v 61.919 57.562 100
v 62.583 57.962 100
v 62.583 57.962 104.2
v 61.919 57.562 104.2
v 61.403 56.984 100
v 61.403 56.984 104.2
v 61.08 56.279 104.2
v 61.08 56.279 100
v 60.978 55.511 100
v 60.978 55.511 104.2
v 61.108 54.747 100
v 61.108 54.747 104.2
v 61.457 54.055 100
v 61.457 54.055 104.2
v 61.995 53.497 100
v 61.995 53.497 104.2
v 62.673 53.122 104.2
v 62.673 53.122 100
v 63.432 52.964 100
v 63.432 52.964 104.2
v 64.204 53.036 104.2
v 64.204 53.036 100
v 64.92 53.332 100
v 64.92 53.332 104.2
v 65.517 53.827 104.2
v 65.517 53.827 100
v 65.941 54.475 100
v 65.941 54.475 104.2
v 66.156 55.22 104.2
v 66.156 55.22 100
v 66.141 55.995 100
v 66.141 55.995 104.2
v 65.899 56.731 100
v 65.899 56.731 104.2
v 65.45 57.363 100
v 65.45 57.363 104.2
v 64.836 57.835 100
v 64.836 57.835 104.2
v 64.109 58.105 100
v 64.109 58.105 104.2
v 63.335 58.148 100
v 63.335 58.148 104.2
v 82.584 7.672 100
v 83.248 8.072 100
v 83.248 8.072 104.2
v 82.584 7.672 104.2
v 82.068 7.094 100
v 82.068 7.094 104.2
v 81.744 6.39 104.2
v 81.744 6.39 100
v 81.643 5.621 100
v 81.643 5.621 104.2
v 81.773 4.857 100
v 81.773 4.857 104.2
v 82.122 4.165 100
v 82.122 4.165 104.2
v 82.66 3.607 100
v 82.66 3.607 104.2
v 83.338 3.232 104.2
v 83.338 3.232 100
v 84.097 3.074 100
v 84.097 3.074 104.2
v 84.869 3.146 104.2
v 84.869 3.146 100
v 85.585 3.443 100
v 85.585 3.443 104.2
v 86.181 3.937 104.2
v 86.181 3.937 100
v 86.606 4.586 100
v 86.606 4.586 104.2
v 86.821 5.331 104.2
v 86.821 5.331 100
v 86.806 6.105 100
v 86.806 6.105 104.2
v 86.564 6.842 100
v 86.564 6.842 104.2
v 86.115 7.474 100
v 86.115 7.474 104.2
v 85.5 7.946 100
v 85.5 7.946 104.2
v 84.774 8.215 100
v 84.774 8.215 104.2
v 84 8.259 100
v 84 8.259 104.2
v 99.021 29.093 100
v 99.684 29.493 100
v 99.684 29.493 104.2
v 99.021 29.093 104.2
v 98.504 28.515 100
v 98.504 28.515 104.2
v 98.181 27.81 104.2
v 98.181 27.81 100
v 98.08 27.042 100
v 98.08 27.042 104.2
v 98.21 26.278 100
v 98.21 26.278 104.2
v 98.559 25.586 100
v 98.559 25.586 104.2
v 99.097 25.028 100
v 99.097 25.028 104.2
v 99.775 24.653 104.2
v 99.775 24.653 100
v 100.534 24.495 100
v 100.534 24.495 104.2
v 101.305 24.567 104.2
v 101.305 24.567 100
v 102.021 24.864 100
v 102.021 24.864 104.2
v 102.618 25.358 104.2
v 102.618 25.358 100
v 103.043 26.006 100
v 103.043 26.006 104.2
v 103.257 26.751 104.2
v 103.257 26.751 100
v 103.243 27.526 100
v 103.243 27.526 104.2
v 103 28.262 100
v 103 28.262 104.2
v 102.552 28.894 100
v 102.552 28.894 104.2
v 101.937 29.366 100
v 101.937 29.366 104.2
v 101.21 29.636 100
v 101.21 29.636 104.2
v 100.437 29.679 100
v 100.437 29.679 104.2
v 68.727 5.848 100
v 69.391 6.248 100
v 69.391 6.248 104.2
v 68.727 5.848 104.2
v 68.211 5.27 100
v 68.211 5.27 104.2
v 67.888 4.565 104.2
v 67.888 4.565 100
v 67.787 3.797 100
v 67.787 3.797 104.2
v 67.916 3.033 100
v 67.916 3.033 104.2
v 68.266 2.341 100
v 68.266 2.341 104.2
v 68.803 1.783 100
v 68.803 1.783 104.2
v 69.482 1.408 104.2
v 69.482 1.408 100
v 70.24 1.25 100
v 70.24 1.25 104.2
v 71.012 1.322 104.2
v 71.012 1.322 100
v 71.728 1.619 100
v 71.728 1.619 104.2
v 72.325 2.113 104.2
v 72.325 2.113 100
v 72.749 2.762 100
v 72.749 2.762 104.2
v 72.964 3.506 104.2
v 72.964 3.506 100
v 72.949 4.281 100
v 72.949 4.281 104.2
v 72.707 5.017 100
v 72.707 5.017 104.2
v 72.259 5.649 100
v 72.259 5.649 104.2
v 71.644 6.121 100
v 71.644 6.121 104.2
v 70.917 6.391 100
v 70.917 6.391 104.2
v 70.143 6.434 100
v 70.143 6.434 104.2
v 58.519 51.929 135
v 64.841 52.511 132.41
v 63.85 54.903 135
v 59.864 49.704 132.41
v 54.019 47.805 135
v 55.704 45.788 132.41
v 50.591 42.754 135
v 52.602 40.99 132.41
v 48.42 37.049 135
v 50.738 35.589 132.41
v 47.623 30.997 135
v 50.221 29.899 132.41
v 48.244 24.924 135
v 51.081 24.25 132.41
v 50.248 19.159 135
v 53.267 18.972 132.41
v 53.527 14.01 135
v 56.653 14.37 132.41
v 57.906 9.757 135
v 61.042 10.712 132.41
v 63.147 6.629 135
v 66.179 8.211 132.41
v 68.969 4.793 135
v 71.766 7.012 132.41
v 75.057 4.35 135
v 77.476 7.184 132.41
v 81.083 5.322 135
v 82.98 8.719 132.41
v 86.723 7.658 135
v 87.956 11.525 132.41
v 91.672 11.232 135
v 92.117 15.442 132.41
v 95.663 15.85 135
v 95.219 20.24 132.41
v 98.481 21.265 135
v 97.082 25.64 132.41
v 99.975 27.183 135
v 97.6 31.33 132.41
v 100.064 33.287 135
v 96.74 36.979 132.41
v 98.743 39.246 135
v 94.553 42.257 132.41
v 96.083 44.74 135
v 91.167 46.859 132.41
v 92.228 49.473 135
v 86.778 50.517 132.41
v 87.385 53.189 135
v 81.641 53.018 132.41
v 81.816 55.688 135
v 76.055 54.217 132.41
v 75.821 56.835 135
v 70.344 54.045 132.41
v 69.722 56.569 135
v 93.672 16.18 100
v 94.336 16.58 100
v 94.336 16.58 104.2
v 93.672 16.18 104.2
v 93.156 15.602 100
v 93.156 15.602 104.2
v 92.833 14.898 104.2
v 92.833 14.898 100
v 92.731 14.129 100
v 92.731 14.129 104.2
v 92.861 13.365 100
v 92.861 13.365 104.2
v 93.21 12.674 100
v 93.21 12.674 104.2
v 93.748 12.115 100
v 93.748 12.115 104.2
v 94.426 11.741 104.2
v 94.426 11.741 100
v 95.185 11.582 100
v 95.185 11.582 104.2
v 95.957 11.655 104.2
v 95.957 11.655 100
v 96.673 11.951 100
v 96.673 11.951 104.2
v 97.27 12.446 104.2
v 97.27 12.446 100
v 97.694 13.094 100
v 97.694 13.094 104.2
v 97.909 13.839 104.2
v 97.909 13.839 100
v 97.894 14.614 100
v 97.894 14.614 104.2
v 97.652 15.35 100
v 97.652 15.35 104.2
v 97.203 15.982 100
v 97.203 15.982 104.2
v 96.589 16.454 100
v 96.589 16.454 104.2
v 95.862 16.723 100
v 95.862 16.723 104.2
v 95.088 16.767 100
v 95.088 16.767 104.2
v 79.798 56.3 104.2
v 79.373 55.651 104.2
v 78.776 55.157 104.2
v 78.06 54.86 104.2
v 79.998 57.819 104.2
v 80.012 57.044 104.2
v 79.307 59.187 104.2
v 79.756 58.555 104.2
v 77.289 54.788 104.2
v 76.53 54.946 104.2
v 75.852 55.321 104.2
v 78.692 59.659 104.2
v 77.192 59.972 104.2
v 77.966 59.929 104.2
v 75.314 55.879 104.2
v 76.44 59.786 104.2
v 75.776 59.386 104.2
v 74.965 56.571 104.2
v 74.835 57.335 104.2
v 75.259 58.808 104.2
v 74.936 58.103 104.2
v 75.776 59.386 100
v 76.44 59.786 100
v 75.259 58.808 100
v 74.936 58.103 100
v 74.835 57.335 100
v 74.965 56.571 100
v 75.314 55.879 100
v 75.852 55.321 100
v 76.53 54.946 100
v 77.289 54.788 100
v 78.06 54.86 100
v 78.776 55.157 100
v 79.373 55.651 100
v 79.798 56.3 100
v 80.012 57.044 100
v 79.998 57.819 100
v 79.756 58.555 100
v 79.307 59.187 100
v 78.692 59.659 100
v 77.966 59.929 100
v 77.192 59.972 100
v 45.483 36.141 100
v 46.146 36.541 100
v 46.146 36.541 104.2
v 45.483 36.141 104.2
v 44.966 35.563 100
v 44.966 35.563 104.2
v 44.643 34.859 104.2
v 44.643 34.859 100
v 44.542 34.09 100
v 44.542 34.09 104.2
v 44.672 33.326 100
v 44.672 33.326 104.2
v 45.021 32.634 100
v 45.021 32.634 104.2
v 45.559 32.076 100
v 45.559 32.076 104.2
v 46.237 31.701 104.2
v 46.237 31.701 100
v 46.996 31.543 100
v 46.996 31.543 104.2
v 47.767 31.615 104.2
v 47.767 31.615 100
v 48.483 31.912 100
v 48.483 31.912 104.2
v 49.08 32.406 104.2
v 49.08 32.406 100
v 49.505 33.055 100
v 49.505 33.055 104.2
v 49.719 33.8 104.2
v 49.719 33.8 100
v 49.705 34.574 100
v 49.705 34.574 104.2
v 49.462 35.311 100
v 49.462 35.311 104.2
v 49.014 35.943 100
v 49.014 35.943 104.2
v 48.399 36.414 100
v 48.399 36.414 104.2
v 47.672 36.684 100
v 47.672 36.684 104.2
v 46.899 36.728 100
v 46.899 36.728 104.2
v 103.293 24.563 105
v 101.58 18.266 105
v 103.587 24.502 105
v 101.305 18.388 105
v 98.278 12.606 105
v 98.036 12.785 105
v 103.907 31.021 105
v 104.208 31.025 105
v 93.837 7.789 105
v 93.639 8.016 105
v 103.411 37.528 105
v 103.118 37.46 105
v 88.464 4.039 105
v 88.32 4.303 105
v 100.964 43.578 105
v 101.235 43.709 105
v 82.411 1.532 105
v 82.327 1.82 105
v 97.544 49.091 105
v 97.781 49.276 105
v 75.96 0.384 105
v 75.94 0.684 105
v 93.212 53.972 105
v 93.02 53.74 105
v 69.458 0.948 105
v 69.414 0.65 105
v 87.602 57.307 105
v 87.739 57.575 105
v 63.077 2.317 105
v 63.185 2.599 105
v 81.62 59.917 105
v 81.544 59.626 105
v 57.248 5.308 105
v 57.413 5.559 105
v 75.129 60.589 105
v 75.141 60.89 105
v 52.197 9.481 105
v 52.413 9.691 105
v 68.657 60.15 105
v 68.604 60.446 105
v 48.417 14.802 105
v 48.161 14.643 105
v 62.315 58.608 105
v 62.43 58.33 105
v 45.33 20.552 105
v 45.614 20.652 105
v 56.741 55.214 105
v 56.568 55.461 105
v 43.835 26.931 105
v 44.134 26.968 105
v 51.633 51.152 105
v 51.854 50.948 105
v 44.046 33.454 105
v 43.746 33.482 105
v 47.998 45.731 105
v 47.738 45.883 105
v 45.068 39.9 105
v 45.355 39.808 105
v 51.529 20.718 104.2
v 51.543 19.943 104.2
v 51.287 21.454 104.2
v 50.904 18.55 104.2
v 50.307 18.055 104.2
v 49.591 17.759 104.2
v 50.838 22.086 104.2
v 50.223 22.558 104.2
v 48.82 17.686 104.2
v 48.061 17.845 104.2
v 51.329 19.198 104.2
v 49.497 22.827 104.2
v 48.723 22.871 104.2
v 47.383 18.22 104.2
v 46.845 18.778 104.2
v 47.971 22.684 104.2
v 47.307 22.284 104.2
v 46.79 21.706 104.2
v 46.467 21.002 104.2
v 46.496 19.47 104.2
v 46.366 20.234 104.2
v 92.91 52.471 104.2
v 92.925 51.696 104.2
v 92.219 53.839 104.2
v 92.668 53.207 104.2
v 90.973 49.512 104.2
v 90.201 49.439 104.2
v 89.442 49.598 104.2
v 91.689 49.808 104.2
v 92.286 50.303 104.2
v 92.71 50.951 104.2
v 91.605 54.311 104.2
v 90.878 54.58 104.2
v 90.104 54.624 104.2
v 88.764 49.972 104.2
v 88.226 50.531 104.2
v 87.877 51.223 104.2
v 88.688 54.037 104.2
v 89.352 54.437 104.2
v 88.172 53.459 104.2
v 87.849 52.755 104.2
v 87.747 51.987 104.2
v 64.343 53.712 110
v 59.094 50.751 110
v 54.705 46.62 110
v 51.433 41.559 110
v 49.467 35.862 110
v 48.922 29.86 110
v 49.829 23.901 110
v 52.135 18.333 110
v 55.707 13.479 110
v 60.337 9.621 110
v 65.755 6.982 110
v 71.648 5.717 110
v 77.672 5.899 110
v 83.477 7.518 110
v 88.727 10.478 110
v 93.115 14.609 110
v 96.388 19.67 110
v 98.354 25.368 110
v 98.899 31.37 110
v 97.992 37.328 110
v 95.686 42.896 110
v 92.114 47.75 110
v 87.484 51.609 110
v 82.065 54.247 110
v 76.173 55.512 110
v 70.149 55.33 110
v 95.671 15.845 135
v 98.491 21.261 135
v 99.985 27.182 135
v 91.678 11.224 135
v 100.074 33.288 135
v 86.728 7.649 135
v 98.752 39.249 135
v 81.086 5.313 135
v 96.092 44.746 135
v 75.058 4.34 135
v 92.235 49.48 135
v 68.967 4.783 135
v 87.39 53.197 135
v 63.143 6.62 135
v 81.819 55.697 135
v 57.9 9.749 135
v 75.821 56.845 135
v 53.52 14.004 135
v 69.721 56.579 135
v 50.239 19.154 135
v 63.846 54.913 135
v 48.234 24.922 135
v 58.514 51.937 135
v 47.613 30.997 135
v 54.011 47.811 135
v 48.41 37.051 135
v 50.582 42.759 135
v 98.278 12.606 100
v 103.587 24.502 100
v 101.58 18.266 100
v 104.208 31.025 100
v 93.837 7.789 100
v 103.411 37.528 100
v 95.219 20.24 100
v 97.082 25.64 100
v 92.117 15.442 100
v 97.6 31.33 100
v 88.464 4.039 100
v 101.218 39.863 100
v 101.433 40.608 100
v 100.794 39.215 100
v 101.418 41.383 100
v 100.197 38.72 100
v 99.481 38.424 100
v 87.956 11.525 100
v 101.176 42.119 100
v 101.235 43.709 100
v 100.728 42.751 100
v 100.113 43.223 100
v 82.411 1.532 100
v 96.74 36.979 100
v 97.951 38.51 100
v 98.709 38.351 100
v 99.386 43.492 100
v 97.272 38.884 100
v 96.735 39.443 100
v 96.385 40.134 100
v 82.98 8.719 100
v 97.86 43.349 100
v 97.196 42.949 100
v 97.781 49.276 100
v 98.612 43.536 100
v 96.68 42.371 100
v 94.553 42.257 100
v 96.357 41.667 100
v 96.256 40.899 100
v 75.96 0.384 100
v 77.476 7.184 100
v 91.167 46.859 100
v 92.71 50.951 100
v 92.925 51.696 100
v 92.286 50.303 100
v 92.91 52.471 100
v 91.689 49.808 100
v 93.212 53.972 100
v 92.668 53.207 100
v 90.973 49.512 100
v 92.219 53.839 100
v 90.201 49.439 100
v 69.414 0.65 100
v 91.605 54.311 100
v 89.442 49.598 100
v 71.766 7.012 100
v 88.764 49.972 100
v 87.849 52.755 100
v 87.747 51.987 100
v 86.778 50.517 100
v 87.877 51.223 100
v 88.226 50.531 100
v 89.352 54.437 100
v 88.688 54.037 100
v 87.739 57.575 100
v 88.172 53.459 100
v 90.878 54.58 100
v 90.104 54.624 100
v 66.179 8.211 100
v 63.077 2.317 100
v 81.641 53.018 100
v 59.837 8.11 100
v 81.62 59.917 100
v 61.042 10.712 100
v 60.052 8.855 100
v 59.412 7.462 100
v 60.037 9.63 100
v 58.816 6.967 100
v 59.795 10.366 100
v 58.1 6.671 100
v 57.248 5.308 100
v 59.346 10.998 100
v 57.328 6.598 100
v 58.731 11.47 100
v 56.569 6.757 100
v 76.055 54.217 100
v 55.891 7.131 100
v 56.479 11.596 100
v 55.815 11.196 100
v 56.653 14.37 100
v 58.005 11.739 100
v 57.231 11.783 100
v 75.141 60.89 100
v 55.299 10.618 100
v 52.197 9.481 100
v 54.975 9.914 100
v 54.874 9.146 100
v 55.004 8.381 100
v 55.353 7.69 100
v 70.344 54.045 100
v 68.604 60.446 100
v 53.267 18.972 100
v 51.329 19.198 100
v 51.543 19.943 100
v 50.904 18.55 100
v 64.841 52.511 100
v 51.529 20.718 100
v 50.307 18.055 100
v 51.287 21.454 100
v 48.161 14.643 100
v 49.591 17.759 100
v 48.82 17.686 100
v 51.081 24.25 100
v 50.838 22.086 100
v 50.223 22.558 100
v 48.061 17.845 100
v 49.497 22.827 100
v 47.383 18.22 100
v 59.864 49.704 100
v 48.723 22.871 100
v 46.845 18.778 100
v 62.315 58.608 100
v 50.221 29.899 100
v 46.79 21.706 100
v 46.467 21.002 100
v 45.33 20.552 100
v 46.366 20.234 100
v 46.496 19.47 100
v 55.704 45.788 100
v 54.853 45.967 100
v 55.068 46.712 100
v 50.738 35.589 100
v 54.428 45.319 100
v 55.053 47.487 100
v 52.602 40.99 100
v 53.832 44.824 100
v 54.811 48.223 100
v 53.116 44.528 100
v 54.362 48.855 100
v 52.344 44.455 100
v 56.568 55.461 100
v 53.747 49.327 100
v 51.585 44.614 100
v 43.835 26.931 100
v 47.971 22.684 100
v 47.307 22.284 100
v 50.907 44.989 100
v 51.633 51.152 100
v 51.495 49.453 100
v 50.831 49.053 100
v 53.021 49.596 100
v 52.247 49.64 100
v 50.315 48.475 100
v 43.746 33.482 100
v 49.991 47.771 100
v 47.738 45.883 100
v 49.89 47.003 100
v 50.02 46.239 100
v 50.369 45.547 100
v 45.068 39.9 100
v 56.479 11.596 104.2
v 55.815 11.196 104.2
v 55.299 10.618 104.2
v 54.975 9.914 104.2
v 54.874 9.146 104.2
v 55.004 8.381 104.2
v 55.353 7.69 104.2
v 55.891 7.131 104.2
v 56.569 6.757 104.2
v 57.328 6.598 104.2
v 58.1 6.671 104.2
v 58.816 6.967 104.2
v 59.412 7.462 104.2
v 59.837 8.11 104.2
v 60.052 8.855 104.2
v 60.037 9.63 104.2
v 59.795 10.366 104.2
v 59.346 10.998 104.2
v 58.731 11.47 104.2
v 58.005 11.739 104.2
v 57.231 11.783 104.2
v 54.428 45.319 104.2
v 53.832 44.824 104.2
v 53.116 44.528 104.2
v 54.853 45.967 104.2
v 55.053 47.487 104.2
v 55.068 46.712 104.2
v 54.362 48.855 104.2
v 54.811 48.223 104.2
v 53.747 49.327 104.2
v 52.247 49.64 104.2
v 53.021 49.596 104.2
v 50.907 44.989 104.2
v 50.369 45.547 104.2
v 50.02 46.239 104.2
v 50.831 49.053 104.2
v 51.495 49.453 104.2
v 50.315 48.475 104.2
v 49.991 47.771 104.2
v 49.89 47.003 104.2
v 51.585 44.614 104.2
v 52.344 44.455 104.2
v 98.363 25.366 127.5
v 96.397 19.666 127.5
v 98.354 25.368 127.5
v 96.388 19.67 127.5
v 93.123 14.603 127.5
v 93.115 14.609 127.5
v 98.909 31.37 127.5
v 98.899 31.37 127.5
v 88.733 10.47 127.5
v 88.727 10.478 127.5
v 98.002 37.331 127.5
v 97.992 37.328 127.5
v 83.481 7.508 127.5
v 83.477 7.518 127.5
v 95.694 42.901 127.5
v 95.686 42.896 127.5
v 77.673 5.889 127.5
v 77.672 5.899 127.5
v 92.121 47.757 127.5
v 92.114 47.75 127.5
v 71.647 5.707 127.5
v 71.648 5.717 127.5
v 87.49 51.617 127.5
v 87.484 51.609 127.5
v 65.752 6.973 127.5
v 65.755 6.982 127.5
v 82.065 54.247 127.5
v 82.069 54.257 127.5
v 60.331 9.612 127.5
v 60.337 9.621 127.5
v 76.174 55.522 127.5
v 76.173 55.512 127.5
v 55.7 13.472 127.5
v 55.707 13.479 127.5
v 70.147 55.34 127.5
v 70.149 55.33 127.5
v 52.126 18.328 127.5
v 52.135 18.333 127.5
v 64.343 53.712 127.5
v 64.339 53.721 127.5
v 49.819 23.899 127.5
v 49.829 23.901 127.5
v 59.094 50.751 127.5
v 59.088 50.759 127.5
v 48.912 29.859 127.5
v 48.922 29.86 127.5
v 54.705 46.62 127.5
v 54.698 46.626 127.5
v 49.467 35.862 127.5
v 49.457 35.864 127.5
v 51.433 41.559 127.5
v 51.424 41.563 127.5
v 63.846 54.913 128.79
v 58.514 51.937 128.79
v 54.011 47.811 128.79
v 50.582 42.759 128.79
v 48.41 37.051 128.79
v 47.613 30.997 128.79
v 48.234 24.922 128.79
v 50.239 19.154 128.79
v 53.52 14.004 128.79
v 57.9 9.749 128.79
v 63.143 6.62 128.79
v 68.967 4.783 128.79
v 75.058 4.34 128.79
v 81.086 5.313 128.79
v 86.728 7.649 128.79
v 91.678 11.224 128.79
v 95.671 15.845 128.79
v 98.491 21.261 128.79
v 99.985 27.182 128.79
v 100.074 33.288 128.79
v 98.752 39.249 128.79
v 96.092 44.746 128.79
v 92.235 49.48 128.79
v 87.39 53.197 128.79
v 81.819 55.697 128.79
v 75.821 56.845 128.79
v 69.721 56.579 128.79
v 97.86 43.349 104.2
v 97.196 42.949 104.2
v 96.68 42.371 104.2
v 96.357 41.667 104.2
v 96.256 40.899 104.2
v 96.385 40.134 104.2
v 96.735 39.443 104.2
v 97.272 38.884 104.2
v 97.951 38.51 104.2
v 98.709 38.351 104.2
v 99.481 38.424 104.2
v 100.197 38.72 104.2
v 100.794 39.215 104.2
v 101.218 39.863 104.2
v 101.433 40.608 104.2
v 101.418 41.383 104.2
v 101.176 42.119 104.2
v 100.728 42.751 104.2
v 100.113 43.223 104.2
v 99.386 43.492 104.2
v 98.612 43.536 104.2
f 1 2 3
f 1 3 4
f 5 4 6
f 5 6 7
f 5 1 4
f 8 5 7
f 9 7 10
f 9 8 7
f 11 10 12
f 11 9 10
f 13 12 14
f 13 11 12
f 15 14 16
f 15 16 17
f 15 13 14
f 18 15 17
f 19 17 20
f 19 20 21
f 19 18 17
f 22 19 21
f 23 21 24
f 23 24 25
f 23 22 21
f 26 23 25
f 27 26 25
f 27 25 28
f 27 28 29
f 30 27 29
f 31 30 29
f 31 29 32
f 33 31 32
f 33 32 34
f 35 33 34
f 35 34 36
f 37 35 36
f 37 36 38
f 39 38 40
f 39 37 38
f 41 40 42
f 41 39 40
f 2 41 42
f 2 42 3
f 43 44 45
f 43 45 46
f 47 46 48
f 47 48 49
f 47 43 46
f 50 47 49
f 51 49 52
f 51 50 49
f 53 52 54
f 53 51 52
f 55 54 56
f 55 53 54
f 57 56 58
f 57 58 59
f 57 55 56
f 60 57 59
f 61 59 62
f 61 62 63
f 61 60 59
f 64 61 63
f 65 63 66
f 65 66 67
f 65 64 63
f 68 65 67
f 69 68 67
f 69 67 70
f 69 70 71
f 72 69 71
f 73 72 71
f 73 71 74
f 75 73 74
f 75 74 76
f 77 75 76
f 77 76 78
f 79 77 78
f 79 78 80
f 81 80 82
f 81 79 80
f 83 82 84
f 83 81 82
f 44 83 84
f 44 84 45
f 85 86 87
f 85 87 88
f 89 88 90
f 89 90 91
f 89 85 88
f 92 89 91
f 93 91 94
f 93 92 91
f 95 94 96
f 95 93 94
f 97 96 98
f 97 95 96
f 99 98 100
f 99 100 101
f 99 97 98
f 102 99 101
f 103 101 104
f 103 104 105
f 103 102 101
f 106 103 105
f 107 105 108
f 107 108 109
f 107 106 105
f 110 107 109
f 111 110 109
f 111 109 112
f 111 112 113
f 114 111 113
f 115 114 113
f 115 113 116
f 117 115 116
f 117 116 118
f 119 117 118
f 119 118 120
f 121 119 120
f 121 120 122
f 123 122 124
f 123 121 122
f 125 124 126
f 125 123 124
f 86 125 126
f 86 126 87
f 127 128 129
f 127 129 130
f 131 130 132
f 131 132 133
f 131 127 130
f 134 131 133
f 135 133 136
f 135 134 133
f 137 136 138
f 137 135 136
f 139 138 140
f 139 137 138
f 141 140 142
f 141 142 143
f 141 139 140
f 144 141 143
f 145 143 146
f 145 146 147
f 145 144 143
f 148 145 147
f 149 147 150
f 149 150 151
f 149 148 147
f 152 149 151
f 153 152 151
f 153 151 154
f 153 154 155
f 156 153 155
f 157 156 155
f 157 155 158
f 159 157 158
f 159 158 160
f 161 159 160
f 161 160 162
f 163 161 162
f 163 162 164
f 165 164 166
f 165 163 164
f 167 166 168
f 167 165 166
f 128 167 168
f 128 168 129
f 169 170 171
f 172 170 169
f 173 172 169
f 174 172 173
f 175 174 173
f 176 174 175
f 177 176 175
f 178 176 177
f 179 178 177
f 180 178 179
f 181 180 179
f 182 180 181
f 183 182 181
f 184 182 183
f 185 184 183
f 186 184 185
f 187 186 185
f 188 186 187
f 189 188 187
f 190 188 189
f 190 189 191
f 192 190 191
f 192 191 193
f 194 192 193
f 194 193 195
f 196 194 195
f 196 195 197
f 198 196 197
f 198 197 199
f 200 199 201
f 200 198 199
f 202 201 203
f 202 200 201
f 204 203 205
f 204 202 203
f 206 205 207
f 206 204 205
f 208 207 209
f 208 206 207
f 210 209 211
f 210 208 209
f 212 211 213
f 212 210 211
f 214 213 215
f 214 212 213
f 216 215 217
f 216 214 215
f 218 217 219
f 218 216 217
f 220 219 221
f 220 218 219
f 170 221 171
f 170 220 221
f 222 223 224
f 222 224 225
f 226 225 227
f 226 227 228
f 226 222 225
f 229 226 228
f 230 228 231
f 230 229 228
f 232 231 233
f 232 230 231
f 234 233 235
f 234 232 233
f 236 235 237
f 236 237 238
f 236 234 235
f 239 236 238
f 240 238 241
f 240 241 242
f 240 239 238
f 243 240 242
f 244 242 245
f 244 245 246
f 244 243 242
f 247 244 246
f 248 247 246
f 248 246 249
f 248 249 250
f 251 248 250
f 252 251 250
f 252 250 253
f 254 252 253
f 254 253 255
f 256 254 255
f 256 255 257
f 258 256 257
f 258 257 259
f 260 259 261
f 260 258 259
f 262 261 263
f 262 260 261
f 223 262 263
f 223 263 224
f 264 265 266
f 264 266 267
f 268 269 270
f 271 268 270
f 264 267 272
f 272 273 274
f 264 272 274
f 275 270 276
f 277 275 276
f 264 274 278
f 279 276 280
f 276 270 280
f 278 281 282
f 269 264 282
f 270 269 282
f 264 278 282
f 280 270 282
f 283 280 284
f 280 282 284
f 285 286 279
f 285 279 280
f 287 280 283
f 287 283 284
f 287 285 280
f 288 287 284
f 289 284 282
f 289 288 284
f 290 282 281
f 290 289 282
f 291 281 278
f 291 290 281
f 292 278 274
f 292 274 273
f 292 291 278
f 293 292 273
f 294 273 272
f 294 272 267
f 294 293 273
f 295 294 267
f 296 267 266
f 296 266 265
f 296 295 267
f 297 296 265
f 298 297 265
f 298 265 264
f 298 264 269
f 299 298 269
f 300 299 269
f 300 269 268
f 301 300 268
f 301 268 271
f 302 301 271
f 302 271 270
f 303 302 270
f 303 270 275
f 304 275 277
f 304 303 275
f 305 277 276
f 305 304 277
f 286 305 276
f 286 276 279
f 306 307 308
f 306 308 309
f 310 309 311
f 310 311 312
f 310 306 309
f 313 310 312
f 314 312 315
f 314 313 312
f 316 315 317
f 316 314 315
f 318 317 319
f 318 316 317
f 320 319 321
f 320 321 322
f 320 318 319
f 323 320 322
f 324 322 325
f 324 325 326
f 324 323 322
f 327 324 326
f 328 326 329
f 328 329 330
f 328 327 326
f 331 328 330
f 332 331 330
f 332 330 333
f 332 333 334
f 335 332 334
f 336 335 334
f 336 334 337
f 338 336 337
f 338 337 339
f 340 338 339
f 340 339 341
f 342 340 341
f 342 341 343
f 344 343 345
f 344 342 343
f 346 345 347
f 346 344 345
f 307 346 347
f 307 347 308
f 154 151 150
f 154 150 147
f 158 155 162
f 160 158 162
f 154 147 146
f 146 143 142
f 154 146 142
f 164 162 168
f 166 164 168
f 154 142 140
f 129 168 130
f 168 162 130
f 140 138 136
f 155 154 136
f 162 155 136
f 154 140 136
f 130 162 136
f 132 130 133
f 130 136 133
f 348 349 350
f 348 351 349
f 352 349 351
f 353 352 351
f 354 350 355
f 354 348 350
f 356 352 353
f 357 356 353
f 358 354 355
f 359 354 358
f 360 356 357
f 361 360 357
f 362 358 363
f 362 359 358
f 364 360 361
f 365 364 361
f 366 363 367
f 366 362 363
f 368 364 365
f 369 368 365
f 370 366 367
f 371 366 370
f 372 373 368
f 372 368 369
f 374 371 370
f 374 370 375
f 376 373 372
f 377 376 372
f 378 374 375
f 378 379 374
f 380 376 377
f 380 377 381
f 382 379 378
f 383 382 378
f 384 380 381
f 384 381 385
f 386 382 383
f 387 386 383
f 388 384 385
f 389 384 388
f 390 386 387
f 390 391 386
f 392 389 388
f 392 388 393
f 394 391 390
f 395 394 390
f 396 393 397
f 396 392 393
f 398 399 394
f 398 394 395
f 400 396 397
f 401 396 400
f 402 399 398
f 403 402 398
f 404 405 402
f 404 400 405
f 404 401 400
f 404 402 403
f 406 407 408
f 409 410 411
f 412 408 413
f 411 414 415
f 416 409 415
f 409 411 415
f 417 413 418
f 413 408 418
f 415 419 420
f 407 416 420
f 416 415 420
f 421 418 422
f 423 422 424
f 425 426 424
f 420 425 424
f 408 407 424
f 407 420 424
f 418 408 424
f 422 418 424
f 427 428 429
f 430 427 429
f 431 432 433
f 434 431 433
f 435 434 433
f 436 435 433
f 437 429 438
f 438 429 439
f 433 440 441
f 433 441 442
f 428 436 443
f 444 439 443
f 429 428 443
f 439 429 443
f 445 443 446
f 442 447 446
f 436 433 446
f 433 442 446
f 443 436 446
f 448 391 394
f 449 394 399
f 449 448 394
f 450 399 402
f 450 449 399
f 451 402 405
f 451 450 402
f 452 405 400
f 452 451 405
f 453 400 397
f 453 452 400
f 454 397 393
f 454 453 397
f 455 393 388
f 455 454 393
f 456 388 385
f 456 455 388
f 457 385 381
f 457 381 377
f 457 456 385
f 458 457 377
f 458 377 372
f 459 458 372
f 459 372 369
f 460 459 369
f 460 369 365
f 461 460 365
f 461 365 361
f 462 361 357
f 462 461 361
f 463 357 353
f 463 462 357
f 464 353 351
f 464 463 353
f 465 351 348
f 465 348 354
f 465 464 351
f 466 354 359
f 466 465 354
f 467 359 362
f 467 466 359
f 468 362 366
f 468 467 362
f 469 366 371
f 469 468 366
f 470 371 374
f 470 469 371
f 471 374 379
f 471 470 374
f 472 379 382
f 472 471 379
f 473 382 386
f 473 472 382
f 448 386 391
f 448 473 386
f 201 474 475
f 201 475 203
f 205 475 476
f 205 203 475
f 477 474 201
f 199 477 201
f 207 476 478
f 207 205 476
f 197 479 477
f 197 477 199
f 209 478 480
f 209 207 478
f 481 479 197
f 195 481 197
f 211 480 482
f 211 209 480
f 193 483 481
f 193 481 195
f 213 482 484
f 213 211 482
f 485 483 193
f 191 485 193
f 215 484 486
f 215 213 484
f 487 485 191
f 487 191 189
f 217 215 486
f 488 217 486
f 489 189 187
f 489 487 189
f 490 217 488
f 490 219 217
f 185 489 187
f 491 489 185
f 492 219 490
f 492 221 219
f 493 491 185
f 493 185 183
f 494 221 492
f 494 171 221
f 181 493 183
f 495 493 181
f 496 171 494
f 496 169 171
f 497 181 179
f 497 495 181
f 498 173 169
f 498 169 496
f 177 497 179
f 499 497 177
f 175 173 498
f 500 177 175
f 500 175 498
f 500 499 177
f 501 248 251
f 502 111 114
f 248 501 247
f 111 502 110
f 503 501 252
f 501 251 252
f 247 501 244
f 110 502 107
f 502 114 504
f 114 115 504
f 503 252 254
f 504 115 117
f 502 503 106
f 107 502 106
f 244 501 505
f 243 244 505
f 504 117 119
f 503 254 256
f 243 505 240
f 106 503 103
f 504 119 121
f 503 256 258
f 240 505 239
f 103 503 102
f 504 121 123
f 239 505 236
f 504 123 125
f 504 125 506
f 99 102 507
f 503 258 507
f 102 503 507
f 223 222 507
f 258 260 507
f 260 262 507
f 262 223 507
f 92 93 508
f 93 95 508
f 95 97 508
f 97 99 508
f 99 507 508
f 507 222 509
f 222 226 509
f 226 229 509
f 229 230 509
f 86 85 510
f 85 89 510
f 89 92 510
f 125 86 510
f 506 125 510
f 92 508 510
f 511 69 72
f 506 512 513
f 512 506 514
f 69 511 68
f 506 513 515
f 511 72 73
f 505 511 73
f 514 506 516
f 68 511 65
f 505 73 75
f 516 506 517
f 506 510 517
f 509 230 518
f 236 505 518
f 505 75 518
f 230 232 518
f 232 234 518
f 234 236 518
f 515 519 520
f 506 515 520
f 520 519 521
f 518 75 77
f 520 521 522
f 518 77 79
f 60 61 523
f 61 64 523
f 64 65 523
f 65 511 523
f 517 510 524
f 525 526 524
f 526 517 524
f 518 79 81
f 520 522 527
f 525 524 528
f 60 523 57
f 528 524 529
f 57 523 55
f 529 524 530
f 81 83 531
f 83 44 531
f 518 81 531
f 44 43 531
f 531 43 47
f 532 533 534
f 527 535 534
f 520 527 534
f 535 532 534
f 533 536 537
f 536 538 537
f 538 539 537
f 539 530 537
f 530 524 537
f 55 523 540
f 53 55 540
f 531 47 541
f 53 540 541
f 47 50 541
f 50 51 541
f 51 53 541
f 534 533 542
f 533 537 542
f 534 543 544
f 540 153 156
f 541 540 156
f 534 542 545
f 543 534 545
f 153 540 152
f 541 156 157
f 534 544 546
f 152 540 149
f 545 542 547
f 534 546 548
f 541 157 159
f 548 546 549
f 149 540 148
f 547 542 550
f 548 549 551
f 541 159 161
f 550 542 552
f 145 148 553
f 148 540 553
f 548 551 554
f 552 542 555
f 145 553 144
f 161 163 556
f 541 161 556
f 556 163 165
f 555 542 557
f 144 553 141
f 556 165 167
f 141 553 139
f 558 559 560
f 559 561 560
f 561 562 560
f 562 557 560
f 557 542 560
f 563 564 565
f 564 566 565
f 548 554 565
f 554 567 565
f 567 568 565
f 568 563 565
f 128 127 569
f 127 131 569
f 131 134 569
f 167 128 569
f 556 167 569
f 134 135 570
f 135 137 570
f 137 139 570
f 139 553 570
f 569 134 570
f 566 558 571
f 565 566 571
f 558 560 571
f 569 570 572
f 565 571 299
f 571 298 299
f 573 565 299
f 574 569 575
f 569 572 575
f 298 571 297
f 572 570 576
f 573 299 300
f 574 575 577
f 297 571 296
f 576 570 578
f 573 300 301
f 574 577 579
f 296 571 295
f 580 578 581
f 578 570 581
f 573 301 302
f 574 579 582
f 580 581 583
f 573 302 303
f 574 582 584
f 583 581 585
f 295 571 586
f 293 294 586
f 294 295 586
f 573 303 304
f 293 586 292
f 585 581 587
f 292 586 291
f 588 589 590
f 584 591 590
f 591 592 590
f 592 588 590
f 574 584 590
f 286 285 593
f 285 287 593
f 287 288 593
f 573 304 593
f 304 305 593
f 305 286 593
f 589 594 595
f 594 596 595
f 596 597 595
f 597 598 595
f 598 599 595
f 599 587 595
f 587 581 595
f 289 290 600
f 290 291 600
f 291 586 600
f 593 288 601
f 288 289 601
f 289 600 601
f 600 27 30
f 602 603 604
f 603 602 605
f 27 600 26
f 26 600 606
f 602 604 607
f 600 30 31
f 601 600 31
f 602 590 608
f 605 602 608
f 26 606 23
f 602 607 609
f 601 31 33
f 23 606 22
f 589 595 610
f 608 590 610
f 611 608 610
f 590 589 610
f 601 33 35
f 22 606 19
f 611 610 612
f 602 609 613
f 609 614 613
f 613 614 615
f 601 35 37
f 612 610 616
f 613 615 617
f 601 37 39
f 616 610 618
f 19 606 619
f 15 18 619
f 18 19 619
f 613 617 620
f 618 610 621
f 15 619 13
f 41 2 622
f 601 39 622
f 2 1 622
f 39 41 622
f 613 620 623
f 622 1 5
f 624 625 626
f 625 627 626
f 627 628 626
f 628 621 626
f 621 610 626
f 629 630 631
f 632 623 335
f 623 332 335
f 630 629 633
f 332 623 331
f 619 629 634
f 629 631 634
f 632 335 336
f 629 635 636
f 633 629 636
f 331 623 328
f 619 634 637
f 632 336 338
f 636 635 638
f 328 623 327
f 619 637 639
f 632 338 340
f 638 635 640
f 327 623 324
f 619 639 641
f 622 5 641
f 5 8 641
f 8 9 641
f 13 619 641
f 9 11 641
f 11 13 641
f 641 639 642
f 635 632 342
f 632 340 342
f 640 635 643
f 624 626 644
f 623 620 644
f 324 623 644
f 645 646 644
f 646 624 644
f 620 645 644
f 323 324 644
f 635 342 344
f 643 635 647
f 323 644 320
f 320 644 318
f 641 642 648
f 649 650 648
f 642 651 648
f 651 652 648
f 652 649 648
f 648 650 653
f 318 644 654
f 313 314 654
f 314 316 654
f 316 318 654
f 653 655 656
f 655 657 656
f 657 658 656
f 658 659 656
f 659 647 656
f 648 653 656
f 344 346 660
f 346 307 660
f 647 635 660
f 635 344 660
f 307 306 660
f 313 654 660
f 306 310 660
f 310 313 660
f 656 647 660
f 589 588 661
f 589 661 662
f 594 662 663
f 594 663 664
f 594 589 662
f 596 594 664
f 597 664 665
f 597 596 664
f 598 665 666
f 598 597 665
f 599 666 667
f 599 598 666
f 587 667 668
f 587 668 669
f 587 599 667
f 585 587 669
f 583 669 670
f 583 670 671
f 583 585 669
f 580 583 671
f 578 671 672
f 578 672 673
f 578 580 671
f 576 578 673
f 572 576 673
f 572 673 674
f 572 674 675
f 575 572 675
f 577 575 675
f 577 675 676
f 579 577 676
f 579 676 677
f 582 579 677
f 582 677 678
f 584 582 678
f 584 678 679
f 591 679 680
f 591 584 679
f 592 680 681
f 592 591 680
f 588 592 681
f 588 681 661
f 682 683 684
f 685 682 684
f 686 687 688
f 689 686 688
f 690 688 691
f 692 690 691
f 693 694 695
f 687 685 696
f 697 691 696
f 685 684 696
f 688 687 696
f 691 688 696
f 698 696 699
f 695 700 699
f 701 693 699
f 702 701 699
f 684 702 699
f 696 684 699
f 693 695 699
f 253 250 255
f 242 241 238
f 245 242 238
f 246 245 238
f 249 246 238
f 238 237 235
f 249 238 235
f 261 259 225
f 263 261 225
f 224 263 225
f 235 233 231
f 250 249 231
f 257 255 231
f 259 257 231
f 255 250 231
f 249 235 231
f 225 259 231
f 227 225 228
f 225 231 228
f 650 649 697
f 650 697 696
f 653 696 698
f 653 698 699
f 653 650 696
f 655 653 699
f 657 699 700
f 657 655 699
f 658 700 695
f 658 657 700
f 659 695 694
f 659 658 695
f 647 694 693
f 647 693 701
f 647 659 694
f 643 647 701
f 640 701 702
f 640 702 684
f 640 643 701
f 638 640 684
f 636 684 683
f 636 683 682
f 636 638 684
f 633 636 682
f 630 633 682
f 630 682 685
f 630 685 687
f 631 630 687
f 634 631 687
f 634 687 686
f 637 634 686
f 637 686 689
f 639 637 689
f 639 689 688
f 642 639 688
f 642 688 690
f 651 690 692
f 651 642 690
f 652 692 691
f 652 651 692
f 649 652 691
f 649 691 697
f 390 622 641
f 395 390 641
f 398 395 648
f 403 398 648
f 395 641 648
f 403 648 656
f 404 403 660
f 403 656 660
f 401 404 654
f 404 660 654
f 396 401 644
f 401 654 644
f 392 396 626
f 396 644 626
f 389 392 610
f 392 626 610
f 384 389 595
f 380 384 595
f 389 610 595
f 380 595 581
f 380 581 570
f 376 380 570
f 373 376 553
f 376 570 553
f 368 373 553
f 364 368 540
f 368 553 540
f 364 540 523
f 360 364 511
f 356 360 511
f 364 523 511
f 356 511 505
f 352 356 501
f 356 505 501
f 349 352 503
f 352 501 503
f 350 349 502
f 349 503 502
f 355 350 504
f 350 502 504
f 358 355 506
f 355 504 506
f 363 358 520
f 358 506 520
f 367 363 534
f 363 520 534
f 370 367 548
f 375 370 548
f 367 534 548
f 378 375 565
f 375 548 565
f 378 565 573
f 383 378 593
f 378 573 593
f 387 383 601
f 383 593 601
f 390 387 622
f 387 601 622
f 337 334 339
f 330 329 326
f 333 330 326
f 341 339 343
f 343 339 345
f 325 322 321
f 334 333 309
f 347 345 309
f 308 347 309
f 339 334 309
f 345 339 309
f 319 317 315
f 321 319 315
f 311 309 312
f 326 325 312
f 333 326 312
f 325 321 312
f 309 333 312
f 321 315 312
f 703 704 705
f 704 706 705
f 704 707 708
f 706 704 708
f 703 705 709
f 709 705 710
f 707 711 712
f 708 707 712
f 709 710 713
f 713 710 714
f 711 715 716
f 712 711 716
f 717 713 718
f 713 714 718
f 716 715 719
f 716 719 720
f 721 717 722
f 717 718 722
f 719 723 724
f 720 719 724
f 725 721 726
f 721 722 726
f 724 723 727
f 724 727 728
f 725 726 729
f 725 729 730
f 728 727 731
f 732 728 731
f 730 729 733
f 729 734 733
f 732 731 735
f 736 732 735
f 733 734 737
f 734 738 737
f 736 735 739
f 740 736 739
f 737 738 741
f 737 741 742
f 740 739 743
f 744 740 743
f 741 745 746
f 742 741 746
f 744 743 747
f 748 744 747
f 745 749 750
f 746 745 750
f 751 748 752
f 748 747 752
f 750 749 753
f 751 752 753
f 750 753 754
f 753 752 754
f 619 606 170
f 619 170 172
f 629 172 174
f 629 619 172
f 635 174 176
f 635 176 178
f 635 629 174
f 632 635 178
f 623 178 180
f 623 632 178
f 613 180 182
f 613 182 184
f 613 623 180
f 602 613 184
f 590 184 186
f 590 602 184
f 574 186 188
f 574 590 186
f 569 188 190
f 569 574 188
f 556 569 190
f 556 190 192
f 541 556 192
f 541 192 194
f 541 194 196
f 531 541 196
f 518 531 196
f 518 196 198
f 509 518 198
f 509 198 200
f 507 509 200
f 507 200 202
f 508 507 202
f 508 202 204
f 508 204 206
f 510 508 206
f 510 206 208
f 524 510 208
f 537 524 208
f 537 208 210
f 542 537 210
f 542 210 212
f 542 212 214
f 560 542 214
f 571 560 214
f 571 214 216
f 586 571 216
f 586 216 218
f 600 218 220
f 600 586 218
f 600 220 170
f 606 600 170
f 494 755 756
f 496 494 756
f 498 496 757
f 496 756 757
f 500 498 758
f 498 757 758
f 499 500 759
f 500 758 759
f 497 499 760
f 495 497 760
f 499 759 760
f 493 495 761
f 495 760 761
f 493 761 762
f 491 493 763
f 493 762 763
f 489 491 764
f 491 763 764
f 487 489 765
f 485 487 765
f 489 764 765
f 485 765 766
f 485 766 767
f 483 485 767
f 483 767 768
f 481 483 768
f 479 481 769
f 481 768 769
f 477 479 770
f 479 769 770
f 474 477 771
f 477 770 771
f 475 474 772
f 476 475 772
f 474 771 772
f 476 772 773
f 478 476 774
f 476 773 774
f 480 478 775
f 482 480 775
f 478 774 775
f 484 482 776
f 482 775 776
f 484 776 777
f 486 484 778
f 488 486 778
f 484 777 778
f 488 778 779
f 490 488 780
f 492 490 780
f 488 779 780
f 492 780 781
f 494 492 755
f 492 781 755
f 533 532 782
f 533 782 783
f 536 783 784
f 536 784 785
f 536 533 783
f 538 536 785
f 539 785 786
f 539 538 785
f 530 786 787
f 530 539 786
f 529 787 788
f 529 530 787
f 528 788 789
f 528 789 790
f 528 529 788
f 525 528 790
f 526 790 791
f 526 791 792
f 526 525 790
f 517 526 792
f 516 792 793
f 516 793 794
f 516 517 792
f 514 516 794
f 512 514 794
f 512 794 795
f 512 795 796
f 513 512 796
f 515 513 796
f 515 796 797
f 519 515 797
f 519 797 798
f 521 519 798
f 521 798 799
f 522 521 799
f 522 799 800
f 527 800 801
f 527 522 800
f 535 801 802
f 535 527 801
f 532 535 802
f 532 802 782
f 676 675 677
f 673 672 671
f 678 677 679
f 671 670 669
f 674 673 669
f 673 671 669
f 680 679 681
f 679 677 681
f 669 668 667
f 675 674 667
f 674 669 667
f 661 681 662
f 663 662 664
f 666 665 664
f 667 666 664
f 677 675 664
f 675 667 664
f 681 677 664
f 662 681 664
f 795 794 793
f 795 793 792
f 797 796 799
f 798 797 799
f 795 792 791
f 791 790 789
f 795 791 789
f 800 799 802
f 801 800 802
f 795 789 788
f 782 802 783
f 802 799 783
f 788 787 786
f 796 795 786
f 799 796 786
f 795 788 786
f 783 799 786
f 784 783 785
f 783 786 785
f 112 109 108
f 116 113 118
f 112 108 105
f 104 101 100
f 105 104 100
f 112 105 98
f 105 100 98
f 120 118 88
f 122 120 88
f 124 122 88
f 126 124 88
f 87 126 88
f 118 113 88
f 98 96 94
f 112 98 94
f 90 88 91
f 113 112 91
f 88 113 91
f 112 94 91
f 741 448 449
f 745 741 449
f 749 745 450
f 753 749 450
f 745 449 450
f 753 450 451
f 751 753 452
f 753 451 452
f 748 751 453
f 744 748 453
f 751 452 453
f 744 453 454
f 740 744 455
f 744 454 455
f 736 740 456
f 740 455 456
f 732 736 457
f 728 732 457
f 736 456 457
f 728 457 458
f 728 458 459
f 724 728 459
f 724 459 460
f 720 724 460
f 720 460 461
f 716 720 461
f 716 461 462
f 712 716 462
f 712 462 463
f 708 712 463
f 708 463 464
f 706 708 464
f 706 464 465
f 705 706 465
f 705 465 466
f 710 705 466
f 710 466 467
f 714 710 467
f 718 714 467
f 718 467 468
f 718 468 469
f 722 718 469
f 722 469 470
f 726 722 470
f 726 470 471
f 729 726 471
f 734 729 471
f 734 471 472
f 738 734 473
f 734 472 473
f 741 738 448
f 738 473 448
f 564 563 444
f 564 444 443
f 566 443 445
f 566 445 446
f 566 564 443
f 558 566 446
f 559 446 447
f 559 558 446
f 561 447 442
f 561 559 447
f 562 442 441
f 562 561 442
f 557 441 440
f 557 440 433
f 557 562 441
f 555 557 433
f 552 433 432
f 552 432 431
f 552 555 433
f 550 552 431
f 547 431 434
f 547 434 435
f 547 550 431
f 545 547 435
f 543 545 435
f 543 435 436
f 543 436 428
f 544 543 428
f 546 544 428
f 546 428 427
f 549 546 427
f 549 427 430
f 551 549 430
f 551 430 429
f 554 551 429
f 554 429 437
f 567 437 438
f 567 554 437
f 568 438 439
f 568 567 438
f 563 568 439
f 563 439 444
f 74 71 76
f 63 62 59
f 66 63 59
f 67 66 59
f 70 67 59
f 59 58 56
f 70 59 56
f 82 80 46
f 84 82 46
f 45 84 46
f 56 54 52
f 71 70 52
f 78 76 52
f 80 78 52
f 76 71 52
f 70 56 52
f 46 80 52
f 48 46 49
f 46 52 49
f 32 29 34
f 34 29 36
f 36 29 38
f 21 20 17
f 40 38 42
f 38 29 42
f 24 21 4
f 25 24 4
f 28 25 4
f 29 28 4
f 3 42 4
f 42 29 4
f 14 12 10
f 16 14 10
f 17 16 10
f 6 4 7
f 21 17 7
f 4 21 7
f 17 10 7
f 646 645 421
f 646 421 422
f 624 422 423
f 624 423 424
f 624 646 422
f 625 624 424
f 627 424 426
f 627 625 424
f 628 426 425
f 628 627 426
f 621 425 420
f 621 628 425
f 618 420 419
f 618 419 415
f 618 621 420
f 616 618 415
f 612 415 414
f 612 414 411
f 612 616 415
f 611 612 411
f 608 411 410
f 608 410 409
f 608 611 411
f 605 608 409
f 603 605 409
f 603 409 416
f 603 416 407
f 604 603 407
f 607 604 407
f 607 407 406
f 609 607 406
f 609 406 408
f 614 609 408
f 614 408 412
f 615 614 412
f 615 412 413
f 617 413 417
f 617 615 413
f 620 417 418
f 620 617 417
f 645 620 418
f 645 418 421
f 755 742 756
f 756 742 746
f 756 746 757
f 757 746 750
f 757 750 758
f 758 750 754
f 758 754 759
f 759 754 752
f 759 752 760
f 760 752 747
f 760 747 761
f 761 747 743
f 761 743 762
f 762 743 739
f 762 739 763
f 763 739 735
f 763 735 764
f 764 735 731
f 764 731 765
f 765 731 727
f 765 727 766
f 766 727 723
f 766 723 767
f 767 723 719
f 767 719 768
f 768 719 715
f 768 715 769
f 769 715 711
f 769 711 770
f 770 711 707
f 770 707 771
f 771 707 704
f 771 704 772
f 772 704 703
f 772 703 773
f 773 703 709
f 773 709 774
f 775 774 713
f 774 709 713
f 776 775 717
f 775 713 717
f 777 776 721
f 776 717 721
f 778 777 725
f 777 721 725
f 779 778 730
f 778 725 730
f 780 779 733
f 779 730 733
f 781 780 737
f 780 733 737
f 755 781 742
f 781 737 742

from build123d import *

# Parameters (mm, degrees)
SKETCH039_R     = 30.3
SKETCH039_R_2   = 23.7
PAD008_DEPTH    = 5
SKETCH040_R     = 2.6
POCKET011_DEPTH = 4.2
SKETCH041_R     = 25
SKETCH041_R_2   = 23.7
PAD009_DEPTH    = 30
CHAMFER_SIZE2   = 5
CHAMFER_SIZE    = 4.999
SKETCH043_R     = 26.3
SKETCH043_R_2   = 25
PAD010_DEPTH    = 7.5
CHAMFER001_SIZE = 1.29
CHAMFER002_SIZE = 2.59


with BuildPart() as part:
    # Sketch039 → Pad008 (new body)
    with BuildSketch(Plane(origin=(0, 0, 0), x_dir=(-0.3826834324, 0.9238795325, 0), z_dir=(0, 0, 1))):
        with Locations((0, -80)):
            Circle(SKETCH039_R)
        with Locations((0, -80)):
            Circle(SKETCH039_R_2, mode=Mode.SUBTRACT)
    extrude(amount=PAD008_DEPTH)

    # Sketch040 → Pocket011 (cut)
    with BuildSketch(Plane(origin=(0, 0, 0), x_dir=(-0.3826834324, 0.9238795325, 0), z_dir=(0, 0, 1))):
        with Locations((0, -53)):
            Circle(SKETCH040_R)
        with Locations((-23.3826859022, -66.5)):
            Circle(SKETCH040_R)
        with Locations((-23.3826859022, -93.5)):
            Circle(SKETCH040_R)
        with Locations((0, -107)):
            Circle(SKETCH040_R)
        with Locations((23.3826859022, -93.5)):
            Circle(SKETCH040_R)
        with Locations((23.3826859022, -66.5)):
            Circle(SKETCH040_R)
        with Locations((-13.5, -56.6173140978)):
            Circle(SKETCH040_R)
        with Locations((-27, -80)):
            Circle(SKETCH040_R)
        with Locations((-13.5, -103.3826859022)):
            Circle(SKETCH040_R)
        with Locations((13.5, -103.3826859022)):
            Circle(SKETCH040_R)
        with Locations((27, -80)):
            Circle(SKETCH040_R)
        with Locations((13.5, -56.6173140978)):
            Circle(SKETCH040_R)
    extrude(amount=POCKET011_DEPTH, mode=Mode.SUBTRACT)

    # Sketch041 → Pad009 (join)
    with BuildSketch(Plane(origin=(0, 0, 5), x_dir=(-0.3826834324, 0.9238795325, 0), z_dir=(0, 0, 1))):
        with Locations((0, -80)):
            Circle(SKETCH041_R)
        with Locations((0, -80)):
            Circle(SKETCH041_R_2, mode=Mode.SUBTRACT)
    extrude(amount=PAD009_DEPTH)

    # Chamfer
    chamfer_edges = [part.edges().sort_by_distance(p)[0] for p in [
        (83.477448, 7.517686, 5),
    ]]
    chamfer_side = part.faces().sort_by_distance((85.177706, 3.412902, 5))[0]
    chamfer(chamfer_edges, length=CHAMFER_SIZE, length2=CHAMFER_SIZE2, reference=chamfer_side)

    # Sketch043 → Pad010 (join)
    with BuildSketch(Plane(origin=(0, 0, 27.5), x_dir=(-0.3826834324, 0.9238795325, 0), z_dir=(0, 0, 1))):
        with Locations((0, -80)):
            Circle(SKETCH043_R)
        with Locations((0, -80)):
            Circle(SKETCH043_R_2, mode=Mode.SUBTRACT)
    extrude(amount=PAD010_DEPTH)

    # Chamfer001
    chamfer001_edges = [part.edges().sort_by_distance(p)[0] for p in [
        (83.974937, 6.316643, 27.5),
    ]]
    chamfer(chamfer001_edges, length=CHAMFER001_SIZE)

    # Chamfer002
    chamfer002_edges = [part.edges().sort_by_distance(p)[0] for p in [
        (82.97996, 8.71873, 35),
    ]]
    chamfer(chamfer002_edges, length=CHAMFER002_SIZE)


with BuildPart() as part_1:
    # Body006 placement: moved
    add(part.part.moved(Location((0, 0, 100))))


solid = part_1.part
